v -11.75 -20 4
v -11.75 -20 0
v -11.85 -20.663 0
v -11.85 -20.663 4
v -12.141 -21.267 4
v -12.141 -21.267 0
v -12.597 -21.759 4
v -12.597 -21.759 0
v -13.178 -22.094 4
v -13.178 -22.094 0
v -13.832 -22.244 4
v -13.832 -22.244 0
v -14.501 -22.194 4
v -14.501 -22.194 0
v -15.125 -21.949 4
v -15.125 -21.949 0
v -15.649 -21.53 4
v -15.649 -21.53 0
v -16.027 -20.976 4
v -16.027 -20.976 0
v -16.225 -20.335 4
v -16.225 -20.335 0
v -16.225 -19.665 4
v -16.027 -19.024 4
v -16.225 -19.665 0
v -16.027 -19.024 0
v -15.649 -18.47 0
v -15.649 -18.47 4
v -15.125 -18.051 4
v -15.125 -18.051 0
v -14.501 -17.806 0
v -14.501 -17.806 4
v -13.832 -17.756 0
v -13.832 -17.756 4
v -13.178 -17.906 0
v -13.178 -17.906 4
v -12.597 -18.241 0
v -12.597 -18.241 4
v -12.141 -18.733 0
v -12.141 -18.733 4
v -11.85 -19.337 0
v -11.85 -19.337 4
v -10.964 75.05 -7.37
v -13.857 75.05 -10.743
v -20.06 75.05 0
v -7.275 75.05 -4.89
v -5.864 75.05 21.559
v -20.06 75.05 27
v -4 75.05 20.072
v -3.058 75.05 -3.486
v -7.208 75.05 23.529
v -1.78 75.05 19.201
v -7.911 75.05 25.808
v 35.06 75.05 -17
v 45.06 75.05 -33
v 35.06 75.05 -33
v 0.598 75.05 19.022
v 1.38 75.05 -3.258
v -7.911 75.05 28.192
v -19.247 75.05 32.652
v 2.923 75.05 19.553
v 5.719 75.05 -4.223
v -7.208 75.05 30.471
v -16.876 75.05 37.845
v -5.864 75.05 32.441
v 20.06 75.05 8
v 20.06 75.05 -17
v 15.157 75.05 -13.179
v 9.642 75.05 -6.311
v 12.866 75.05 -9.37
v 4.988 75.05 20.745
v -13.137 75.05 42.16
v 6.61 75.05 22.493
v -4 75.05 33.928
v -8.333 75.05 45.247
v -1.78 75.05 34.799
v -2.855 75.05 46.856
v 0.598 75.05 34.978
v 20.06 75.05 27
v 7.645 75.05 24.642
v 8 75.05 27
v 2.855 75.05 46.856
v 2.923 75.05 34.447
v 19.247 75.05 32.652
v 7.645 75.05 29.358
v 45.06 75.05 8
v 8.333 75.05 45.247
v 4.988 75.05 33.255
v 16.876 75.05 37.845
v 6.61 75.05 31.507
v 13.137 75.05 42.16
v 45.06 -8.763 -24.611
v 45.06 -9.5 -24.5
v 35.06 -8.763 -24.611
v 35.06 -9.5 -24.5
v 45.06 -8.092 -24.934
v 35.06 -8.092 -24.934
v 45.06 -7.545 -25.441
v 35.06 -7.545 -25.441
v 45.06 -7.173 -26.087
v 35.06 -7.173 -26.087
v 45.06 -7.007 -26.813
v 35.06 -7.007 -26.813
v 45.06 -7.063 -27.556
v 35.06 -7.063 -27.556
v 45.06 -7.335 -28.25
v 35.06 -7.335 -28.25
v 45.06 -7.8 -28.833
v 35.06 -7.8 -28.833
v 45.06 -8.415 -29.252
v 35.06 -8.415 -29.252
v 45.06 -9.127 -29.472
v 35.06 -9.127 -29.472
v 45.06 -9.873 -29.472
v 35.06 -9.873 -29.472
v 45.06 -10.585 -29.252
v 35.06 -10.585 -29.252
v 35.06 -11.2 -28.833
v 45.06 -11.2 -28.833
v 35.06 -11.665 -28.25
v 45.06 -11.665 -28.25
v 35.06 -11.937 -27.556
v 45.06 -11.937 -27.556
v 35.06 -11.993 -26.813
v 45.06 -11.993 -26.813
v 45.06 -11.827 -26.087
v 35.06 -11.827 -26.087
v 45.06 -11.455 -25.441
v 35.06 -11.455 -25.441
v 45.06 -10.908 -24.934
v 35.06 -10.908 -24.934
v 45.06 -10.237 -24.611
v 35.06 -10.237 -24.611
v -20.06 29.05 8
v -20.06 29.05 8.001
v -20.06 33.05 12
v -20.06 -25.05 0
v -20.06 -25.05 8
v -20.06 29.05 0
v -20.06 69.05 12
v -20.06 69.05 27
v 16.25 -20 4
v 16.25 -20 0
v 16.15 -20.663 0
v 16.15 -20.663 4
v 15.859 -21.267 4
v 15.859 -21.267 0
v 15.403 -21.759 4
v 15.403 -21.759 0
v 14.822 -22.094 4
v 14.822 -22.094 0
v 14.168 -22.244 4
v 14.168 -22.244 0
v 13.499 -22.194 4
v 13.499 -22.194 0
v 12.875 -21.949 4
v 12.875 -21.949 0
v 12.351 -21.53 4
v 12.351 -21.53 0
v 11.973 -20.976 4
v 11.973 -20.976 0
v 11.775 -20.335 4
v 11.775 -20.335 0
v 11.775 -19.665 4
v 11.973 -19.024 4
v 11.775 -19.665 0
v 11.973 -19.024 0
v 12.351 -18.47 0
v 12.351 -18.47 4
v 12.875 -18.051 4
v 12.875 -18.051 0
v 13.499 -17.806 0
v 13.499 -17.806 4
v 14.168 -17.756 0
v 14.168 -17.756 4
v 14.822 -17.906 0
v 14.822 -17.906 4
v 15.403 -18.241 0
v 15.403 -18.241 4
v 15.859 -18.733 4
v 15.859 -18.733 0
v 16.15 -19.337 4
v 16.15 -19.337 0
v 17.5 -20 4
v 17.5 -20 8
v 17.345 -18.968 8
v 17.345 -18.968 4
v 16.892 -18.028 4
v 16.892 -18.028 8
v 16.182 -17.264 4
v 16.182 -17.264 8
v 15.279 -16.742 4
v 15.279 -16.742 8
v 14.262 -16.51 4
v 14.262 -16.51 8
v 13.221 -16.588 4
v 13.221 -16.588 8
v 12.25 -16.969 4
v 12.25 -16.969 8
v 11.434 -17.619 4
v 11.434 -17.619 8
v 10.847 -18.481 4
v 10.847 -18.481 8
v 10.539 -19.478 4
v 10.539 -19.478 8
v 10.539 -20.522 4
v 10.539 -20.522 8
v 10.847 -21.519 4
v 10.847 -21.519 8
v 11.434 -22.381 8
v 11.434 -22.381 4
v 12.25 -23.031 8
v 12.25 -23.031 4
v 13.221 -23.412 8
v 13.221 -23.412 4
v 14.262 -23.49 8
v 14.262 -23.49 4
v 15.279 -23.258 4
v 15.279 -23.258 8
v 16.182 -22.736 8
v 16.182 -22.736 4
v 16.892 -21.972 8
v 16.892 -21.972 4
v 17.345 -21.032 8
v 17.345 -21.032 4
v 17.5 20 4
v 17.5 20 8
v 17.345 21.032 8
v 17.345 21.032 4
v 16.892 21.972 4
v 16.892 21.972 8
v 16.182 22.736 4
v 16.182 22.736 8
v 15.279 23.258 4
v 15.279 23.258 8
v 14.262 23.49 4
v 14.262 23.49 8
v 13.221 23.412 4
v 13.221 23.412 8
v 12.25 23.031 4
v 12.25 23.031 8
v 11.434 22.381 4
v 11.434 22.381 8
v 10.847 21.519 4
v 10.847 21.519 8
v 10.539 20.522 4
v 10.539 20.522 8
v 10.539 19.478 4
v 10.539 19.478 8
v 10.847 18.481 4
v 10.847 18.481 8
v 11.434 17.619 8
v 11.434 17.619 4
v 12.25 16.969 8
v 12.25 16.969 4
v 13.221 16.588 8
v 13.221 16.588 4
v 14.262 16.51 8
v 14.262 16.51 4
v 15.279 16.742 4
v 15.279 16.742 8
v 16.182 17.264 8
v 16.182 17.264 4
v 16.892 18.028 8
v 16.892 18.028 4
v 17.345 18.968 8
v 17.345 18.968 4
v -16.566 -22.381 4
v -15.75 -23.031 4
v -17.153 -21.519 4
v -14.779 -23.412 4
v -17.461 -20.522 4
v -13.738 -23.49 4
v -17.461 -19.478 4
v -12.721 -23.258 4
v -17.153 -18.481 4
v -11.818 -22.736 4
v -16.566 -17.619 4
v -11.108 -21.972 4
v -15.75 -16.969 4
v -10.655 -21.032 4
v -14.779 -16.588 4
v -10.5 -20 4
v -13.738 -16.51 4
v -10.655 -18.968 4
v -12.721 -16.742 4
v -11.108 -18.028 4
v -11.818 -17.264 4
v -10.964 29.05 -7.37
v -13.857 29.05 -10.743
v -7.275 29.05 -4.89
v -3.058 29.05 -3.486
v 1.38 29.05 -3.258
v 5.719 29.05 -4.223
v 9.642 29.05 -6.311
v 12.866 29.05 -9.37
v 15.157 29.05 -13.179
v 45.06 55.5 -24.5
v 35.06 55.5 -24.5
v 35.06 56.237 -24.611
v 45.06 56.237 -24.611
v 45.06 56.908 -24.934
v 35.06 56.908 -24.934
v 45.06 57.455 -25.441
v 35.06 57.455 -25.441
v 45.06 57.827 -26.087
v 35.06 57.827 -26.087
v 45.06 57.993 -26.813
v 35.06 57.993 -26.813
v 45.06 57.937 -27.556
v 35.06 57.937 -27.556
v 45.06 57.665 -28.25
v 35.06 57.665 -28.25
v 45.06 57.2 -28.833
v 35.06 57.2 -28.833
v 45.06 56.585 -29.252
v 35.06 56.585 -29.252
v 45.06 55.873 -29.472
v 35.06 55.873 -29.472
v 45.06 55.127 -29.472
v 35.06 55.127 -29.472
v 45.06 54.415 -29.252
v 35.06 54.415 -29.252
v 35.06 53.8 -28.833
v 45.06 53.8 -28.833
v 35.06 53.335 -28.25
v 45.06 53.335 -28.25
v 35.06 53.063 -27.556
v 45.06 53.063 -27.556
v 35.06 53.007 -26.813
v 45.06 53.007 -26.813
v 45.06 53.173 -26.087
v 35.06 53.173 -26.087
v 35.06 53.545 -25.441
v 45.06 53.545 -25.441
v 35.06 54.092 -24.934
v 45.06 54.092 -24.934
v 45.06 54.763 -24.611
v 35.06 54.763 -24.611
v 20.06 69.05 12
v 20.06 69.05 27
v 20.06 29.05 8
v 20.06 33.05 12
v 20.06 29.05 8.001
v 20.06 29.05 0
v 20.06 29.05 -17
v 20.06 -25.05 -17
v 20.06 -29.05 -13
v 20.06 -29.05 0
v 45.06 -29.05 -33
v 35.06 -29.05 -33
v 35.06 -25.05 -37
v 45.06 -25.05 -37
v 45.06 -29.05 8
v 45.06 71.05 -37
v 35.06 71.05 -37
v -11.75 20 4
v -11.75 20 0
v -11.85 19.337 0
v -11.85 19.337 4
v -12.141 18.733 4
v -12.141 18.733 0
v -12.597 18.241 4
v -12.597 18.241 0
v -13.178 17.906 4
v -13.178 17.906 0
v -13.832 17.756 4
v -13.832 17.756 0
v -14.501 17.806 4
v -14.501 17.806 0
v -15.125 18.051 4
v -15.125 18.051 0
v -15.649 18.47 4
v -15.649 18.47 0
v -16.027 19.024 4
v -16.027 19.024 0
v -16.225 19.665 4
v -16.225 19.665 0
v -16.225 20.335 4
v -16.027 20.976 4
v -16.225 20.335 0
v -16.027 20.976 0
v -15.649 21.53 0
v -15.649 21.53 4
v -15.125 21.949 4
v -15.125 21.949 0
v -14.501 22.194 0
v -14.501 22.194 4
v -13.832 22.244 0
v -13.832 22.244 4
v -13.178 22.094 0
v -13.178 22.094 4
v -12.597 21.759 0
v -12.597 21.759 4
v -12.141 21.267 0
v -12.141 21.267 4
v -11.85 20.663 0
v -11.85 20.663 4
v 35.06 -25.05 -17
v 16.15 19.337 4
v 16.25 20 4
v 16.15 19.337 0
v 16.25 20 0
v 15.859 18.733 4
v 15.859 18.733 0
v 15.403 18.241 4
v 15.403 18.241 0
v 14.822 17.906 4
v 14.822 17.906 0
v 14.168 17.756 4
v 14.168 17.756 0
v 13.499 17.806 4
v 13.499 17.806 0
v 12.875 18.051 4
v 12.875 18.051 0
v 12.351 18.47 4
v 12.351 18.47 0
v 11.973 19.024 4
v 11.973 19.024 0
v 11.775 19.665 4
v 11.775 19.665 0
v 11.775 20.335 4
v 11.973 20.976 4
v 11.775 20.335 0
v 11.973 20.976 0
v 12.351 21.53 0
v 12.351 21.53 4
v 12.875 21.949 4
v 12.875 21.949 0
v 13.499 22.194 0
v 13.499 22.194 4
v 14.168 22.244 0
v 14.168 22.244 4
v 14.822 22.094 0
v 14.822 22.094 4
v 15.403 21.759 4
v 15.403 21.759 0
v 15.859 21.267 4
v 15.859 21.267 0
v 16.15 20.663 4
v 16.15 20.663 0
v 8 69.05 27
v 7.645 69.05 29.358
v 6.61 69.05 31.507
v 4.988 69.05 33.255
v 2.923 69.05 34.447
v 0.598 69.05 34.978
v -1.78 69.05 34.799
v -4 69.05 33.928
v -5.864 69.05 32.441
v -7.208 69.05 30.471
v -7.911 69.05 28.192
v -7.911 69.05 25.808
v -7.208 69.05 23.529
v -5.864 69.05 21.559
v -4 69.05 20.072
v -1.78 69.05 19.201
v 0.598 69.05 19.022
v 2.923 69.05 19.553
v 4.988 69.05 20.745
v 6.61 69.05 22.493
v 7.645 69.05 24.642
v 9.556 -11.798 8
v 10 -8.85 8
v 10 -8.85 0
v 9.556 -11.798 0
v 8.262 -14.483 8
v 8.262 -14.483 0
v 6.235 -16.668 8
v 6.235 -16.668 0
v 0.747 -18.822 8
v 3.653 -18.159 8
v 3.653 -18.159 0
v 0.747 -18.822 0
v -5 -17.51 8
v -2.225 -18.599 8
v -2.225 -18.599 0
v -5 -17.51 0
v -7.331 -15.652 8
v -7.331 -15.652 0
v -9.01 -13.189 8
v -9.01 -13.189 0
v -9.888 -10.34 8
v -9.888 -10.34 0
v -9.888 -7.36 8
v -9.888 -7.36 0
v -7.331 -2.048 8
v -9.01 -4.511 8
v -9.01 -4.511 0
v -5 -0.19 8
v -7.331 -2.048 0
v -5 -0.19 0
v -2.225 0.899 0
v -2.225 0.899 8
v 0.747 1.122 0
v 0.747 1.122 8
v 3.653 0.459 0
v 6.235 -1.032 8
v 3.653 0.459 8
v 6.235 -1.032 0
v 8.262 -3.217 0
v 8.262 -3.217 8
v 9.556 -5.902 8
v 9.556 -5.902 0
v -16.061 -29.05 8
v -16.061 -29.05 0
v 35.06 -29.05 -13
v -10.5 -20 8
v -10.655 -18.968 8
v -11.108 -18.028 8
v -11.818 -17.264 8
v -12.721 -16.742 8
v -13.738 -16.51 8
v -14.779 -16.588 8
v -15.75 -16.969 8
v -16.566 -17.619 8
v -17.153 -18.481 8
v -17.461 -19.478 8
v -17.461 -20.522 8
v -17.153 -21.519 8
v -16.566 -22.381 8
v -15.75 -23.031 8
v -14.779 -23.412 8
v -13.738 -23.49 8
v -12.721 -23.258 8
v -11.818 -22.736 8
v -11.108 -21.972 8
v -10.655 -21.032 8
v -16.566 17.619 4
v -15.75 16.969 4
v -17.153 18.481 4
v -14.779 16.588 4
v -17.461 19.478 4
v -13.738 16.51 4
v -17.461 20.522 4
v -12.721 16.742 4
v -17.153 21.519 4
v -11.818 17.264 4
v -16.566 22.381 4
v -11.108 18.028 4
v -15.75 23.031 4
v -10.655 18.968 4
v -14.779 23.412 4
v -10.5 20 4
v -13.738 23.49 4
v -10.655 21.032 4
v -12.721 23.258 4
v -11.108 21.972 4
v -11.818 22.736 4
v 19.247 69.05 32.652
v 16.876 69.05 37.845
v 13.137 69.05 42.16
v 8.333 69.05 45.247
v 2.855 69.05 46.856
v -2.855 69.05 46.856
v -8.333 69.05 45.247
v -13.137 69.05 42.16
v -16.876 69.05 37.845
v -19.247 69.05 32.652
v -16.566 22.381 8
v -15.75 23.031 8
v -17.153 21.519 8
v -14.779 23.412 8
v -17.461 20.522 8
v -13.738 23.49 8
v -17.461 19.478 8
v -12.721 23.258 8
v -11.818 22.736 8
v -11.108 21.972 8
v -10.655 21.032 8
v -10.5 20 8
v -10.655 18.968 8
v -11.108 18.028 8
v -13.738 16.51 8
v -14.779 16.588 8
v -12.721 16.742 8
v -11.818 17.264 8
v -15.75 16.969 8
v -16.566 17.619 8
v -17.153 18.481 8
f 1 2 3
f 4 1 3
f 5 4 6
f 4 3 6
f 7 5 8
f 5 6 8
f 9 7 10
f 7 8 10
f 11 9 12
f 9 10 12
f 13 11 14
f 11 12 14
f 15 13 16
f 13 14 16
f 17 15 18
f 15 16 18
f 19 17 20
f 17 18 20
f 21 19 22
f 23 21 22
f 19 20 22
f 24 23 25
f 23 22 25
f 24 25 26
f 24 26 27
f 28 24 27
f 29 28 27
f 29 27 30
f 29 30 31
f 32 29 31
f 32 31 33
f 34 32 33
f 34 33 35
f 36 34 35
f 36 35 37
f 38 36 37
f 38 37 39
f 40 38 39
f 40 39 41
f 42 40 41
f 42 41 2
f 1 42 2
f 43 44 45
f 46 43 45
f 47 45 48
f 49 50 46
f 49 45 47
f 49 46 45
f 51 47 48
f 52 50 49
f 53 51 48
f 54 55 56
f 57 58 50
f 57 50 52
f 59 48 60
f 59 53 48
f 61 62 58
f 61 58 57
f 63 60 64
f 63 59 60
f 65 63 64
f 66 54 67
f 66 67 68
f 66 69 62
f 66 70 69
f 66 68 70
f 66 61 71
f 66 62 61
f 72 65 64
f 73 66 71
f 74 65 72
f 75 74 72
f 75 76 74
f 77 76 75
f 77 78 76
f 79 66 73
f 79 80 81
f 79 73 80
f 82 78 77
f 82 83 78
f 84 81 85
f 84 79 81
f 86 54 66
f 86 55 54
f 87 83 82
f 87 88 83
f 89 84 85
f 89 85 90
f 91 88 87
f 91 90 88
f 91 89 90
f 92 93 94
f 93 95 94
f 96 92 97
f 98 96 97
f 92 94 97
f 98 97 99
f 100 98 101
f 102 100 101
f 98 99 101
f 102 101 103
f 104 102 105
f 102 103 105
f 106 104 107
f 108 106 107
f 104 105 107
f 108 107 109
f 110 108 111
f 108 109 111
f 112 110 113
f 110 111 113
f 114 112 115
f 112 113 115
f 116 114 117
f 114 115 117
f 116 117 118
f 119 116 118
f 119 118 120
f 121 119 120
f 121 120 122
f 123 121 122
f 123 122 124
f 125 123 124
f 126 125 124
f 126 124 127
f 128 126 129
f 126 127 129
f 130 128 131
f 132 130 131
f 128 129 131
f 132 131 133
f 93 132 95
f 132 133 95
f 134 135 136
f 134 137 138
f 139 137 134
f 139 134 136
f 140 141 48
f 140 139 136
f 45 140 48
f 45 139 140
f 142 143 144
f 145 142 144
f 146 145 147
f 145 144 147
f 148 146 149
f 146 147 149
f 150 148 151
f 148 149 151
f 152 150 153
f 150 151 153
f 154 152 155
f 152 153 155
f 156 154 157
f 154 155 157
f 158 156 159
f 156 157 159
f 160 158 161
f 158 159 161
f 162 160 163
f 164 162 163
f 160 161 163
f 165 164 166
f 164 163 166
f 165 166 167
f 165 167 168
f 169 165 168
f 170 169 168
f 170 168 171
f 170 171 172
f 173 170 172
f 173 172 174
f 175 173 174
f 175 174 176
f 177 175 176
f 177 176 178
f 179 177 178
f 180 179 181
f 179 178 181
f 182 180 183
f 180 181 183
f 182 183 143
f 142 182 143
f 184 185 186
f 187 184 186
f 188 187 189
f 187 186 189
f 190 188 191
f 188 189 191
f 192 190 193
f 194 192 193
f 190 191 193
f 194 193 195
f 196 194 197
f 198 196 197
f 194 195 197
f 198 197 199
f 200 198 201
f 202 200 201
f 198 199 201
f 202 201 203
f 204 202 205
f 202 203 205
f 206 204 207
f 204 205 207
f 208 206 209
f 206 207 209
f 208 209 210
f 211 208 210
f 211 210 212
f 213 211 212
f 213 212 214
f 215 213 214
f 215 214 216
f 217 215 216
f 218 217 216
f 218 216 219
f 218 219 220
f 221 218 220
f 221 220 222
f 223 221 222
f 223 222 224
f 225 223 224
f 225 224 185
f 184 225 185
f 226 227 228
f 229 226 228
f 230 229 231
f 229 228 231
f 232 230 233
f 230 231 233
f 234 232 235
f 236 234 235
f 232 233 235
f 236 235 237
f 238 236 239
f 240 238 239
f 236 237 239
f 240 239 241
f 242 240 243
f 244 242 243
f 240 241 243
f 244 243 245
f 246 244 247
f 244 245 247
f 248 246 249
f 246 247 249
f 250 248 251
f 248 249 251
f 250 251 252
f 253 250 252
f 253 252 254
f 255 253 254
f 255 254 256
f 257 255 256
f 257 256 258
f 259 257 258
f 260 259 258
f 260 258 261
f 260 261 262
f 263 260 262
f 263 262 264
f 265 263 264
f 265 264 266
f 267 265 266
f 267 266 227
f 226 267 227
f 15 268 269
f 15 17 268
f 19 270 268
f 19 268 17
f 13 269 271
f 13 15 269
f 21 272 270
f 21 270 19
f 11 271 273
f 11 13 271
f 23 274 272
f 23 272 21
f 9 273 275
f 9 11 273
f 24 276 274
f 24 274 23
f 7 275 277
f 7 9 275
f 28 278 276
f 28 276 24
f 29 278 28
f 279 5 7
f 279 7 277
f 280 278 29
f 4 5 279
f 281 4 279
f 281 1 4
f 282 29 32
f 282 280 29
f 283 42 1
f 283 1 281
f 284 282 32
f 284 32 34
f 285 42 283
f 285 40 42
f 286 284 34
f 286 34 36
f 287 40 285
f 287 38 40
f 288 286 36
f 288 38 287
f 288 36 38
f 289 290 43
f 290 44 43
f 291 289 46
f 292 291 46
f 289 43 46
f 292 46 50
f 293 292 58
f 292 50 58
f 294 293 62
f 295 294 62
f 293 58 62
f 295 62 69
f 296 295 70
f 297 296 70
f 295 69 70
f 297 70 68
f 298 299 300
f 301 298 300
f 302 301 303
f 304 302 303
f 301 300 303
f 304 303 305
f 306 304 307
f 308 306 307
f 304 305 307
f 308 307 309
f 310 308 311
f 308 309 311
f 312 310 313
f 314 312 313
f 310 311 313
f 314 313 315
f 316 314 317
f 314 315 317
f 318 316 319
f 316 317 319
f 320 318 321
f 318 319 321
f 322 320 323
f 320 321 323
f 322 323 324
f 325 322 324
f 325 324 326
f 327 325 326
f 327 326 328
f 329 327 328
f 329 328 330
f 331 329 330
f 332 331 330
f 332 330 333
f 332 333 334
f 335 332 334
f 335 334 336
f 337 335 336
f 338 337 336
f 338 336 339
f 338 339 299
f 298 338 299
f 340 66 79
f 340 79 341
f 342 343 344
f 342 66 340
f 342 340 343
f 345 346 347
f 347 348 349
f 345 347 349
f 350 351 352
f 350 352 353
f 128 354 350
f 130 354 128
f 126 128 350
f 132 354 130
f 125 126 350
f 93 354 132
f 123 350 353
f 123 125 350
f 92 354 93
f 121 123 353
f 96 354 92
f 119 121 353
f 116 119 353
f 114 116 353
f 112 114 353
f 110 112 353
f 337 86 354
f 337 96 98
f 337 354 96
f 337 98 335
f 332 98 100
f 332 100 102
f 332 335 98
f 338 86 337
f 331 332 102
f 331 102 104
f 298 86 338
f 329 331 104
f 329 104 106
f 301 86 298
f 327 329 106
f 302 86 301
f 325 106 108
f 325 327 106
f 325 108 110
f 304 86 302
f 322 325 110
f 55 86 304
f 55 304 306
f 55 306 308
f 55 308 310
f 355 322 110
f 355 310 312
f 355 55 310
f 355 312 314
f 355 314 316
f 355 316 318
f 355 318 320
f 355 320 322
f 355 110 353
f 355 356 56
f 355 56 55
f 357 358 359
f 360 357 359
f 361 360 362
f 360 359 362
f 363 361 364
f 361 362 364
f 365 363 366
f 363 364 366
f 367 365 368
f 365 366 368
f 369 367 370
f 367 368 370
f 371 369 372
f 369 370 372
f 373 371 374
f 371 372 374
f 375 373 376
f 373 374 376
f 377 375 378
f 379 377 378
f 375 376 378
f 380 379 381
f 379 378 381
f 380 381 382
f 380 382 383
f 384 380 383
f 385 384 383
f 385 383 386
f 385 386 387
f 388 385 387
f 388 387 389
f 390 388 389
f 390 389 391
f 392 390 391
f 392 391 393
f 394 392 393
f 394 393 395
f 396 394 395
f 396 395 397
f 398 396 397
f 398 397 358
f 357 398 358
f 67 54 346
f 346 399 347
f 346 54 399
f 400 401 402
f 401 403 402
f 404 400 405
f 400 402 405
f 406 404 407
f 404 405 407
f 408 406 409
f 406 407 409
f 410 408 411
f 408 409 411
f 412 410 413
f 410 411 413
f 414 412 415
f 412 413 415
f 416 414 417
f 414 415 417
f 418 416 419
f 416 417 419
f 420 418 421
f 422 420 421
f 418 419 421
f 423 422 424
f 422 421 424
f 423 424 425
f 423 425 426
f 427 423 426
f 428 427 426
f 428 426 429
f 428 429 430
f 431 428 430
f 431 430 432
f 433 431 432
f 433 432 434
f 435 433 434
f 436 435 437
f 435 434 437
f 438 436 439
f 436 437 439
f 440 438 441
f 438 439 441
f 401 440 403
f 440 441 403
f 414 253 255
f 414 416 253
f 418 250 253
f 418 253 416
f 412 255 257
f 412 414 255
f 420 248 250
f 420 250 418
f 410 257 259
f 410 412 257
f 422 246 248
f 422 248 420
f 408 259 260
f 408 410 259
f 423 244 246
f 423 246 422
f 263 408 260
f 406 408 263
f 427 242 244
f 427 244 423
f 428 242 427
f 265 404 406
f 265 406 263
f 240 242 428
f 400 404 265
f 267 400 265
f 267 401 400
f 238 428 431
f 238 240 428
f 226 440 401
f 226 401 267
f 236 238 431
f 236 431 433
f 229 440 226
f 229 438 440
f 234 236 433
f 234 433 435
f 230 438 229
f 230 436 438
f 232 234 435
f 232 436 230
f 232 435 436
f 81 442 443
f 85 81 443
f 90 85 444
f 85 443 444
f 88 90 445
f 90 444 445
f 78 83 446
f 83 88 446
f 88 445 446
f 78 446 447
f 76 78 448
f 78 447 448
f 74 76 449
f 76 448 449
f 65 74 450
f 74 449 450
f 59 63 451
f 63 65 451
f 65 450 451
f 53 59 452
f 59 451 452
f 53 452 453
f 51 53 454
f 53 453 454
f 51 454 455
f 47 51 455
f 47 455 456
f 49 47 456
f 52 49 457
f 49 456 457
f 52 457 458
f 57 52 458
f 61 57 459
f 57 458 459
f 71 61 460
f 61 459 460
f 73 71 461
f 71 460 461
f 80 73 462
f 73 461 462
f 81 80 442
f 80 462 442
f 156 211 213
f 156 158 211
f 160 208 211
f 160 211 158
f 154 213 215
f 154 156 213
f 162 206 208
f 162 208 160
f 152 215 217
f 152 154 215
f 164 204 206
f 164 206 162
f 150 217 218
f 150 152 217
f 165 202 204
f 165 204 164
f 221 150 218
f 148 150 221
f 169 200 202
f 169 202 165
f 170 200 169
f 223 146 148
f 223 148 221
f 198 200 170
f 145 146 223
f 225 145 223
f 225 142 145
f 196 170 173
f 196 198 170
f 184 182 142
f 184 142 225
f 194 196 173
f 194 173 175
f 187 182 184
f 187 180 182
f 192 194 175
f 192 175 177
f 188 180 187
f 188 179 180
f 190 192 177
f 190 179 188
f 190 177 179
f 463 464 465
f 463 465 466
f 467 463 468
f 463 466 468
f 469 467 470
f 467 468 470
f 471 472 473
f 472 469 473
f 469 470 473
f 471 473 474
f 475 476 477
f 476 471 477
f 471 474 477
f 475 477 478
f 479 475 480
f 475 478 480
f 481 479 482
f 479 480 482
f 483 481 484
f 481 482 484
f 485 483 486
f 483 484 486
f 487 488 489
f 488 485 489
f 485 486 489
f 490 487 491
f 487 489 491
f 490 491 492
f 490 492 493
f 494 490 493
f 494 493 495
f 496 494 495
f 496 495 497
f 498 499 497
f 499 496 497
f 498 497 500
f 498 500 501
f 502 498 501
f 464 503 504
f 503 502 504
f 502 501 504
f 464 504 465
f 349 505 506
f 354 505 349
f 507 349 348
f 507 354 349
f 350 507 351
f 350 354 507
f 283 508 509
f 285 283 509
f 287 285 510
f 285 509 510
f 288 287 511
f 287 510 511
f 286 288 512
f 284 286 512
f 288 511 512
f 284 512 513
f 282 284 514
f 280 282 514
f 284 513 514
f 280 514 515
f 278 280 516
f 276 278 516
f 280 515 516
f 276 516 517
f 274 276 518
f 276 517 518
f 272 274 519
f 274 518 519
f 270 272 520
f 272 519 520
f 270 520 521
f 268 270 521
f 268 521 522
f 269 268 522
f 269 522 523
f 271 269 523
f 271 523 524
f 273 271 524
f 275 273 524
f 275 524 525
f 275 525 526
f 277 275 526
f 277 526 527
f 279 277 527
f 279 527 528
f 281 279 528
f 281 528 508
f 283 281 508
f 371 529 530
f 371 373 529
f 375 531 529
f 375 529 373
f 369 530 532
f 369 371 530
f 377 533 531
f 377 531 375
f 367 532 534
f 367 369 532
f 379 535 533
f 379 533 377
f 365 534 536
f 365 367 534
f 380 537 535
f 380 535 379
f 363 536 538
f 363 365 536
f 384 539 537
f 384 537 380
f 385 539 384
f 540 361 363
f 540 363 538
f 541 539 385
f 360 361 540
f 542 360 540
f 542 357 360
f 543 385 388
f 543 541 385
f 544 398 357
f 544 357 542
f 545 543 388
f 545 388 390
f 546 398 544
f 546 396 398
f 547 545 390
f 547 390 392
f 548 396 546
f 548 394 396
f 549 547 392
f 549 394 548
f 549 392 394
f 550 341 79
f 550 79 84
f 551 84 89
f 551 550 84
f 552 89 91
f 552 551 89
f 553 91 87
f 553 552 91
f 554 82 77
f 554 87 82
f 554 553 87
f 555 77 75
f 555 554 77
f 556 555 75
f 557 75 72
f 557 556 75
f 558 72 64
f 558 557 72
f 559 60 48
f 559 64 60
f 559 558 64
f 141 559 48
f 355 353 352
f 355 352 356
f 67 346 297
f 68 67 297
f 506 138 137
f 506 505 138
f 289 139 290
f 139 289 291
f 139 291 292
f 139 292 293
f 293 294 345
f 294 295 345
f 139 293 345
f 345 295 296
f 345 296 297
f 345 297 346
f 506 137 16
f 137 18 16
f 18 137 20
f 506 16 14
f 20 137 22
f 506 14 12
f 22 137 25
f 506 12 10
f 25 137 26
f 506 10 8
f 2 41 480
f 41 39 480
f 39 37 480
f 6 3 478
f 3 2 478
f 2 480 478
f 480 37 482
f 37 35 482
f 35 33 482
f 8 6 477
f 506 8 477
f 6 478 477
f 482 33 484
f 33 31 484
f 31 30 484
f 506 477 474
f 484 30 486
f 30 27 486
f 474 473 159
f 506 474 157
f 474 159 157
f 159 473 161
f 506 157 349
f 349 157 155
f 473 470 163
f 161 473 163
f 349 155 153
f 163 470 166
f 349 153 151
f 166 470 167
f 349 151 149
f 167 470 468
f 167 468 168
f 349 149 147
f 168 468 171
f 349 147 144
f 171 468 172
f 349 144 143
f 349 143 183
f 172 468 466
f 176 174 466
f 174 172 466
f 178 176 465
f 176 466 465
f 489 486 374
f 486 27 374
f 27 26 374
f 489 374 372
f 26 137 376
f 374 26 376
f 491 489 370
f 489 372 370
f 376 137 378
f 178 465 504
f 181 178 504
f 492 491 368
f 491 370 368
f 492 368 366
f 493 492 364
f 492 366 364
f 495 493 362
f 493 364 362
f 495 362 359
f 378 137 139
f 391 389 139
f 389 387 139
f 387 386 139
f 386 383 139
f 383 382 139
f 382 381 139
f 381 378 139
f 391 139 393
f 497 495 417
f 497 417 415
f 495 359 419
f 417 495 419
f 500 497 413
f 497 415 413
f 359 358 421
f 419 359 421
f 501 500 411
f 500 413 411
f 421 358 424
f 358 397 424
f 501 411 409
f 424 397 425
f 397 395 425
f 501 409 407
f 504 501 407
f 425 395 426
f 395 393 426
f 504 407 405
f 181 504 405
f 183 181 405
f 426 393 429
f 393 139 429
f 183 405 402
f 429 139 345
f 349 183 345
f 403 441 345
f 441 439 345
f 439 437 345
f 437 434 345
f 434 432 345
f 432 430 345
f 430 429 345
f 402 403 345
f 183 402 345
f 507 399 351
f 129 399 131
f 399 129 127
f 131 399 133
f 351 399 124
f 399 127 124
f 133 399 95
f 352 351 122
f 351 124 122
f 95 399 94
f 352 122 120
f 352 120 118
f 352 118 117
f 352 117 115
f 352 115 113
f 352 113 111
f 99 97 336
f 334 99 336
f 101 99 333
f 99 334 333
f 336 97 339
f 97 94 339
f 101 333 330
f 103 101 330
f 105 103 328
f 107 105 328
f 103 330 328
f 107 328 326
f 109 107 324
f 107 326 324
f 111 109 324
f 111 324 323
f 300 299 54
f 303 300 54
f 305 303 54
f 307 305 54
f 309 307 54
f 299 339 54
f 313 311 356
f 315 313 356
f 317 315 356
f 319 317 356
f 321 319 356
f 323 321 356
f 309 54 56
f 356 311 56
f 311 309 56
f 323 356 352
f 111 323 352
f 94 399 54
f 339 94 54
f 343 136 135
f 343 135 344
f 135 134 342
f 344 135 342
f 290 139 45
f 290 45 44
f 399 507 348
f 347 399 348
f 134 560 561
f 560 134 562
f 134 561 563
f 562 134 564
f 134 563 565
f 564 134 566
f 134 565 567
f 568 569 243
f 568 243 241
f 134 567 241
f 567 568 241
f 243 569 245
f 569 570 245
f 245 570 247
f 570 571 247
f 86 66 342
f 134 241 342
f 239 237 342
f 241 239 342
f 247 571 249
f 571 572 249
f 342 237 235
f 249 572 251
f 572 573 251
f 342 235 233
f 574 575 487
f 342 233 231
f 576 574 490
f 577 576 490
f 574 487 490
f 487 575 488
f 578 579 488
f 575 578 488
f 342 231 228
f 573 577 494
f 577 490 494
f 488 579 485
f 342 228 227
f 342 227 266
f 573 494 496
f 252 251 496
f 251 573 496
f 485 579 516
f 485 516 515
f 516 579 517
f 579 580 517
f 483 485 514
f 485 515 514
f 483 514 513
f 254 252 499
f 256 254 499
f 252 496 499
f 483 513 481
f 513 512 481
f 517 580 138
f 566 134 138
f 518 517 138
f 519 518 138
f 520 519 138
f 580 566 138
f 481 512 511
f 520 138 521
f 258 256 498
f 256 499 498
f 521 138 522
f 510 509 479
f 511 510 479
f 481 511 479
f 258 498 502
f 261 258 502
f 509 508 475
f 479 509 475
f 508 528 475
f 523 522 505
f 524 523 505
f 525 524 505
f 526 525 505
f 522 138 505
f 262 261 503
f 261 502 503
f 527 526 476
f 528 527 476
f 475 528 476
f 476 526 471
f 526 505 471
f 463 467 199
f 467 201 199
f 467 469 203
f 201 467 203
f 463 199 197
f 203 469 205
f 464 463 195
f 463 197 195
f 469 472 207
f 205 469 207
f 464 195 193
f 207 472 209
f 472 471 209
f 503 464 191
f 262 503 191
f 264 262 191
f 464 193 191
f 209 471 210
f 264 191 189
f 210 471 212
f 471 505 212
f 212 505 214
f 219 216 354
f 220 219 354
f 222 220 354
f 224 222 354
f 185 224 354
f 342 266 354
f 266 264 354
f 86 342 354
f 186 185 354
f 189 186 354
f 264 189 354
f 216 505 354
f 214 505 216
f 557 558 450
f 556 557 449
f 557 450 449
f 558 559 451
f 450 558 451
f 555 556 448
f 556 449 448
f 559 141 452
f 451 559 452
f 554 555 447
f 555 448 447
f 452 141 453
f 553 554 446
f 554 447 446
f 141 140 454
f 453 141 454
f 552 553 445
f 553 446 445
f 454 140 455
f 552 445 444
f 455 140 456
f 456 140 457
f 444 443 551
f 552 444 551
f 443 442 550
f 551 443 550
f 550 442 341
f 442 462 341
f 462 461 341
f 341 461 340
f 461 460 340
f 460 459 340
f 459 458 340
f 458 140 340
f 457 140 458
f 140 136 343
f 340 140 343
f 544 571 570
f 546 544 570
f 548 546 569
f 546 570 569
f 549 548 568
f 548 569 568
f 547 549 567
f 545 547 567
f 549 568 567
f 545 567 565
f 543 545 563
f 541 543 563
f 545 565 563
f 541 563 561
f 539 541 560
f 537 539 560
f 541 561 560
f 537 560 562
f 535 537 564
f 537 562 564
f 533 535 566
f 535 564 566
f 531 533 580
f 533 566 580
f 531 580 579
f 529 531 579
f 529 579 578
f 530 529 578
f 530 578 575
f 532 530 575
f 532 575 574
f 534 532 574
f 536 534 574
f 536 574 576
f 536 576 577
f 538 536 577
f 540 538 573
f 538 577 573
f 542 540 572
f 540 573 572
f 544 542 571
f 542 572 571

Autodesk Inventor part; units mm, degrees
ref_plane "YZ Plane" through (0, 0, 0) normal (1, 0, 0) x (0, 1, 0)
ref_plane "XZ Plane" through (0, 0, 0) normal (0, 1, 0) x (-1, 0, 0)
ref_plane "XY Plane" through (0, 0, 0) normal (0, 0, 1) x (1, 0, 0)
sketch "Sketch1" plane through (0, 0, 0) normal (0, 0, 1) x (1, 0, 0)
  line L0 (14, -20) -> (-14, -20) construction
  line L1 (-14, -20) -> (-14, 20) construction
  line L2 (-14, 20) -> (14, 20) construction
  line L3 (14, 20) -> (14, -20) construction
  line L4 (14, -20) -> (-14, 20) construction
  line L5 (-14, -20) -> (14, 20) construction
  circle A0 centre (-14, 20) radius 2.25
  circle A1 centre (14, 20) radius 2.25
  circle A2 centre (14, -20) radius 2.25
  circle A3 centre (-14, -20) radius 2.25
  line L6 (0, 0) -> (0, -8.85) construction
  circle A4 centre (0, -8.85) radius 10
  line L7 (20.06, -29.05) -> (-20.06, -29.05)
  line L8 (-20.06, -29.05) -> (-20.06, 29.05)
  line L9 (-20.06, 29.05) -> (20.06, 29.05)
  line L10 (20.06, 29.05) -> (20.06, -29.05)
  line L11 (20.06, -29.05) -> (-20.06, 29.05) construction
  line L12 (-20.06, -29.05) -> (20.06, 29.05) construction
  dimension "d0" = 28
  dimension "d1" = 40
  dimension "d2" = 20
  dimension "d3" = 4.5
  dimension "d4" = 58.1
  dimension "d5" = 40.12
  dimension "d6" = 37.9
extrude "Extrusion1" add sketch "Sketch1" along normal blind 8
sketch "Sketch2" plane through (0, 0, 8) normal (0, 0, 1) x (1, 0, 0)
  circle A0 centre (0, -8.85) radius 10 construction
  circle A1 centre (-14, -20) radius 2.25 construction
  circle A2 centre (14, -20) radius 2.25 construction
  circle A3 centre (14, 20) radius 2.25 construction
  circle A4 centre (-14, 20) radius 2.25 construction
  line L0 (-20.06, -29.05) -> (20.06, -29.05) construction
  line L1 (20.06, -29.05) -> (20.06, 29.05) construction
  line L2 (20.06, 29.05) -> (-20.06, 29.05) construction
  line L3 (-20.06, 29.05) -> (-20.06, -29.05) construction
  circle A5 centre (14, -20) radius 3.5
  circle A6 centre (-14, -20) radius 3.5
  circle A7 centre (14, 20) radius 3.5
  circle A8 centre (-14, 20) radius 3.5
  point P0 (0, 0)
  dimension "d9" = 7
extrude "Extrusion2" cut sketch "Sketch2" against normal blind 4
sketch "Sketch3" plane through (-20.06, 29.05, 0) normal (0, 1, 0) x (1, 0, 0)
  line L0 (40.12, 0) -> (0, 0)
  line L1 (0, 0) -> (0, -12)
  line L2 (0, -12) -> (40.12, -12)
  line L3 (40.12, -12) -> (40.12, 0)
  circle A0 centre (20.06, 19.7) radius 15.5 construction
  line L4 (40.12, 0) -> (33.3508, 11.7247)
  line L5 (0, 0) -> (6.7692, 11.7247)
  arc A1 (6.7692, 11.7247) -> (33.3508, 11.7247) centre (20.06, 19.7) ccw
  line L6 (40.12, 0) -> (0, 0) projected
  line L7 (40.12, 0) -> (0, 0)
  point P0 (20.06, 0)
  dimension "d12" = 12
  dimension "d19" = 60
extrude "Extrusion3" add sketch "Sketch3" along normal blind 40
sketch "Sketch4" plane through (-20.06, 69.05, 0) normal (0, 1, 0) x (1, 0, 0)
  line L0 (20.06, 0) -> (20.06, -27) construction
  circle A0 centre (20.06, -27) radius 8
  line L1 (20.06, -27) -> (20.06, 0) construction
  line L2 (40.12, 0) -> (0, 0) projected
  line L3 (40.12, -27) -> (40.12, 0)
  line L4 (0, 0) -> (0, -27)
  arc A1 (0, -27) -> (40.12, -27) centre (20.06, -27) ccw
  arc A2 (40.12, 0) -> (0, 0) centre (20.06, 0) ccw construction
  line L5 (40.12, 0) -> (40.12, -8) projected
  line L6 (40.12, 0) -> (0, 0)
  line L7 (0, 0) -> (40.12, 0)
  line L8 (40.12, 0) -> (33.3508, 11.7247) projected
  arc A3 (6.7692, 11.7247) -> (33.3508, 11.7247) centre (20.06, 19.7) ccw projected
  line L9 (6.7692, 11.7247) -> (0, 0) projected
  line L10 (0, 0) -> (0, -12) projected
  line L11 (0, -12) -> (40.12, -12) projected
  line L12 (40.12, -12) -> (40.12, 0) projected
  point P0 (20.06, -13.5)
  dimension "d15" = 27
  dimension "d16" = 16
extrude "Extrusion4" add sketch "Sketch4" along normal blind 6
sketch "Sketch5" plane through (-20.06, -29.05, 0) normal (0, -1, 0) x (1, 0, 0)
  line L0 (40.12, 0) -> (40.12, 8) projected
  line L1 (40.12, 8) -> (65.12, 8)
  line L2 (65.12, 8) -> (65.12, -17)
  line L3 (65.12, -17) -> (40.12, -17)
  line L4 (40.12, -17) -> (40.12, 8)
  line L5 (40.12, 0) -> (33.3508, -11.7247) projected
  line L6 (33.3508, -11.7247) -> (40.12, -17)
  line L7 (40.12, 27) -> (40.12, 0) projected
  line L8 (40.12, -17) -> (40.12, 0)
  point P0 (20.06, 0)
  dimension "d20" = 25
  dimension "d21" = 25
extrude "Extrusion5" add sketch "Sketch5" against normal up to surface (58.1 mm away) contours L0 L1 L2 L3 L4
sketch "Sketch6" plane through (20.06, 29.05, -17) normal (0, 1, 0) x (1, 0, 0)
  line L0 (25, 0) -> (0, 0) projected
  line L1 (0, 0) -> (0, -17) projected
  line L2 (0, -25) -> (0, -17) projected
  line L3 (0, -25) -> (25, -25) projected
  line L4 (25, -25) -> (25, 0) projected
  line L5 (0, -17) -> (-6.7692, -5.2753) projected
  line L6 (25, 0) -> (0, 0) projected
  line L7 (0, 0) -> (-6.7692, -5.2753)
  line L8 (0, 0) -> (0, -17) projected
  line L9 (0, -17) -> (0, 0)
  point P0 (-20.06, -17)
extrude "Extrusion6" add sketch "Sketch6" along normal up to surface (46 mm away)
sketch "Sketch7" plane through (45.06, -29.05, 8) normal (1, 0, 0) x (0, 0, -1)
  line L0 (25, 104.1) -> (0, 104.1) projected
  line L1 (25, 0) -> (25, 104.1) projected
  line L2 (25, 104.1) -> (25, 0)
  line L3 (25, 0) -> (45, 0)
  line L4 (45, 0) -> (45, 104.1)
  line L5 (45, 104.1) -> (25, 104.1)
  point P0 (8, 29.05)
  dimension "d26" = 20
extrude "Extrusion7" add sketch "Sketch7" against normal blind 10
sketch "Sketch8" plane through (35.06, -29.05, 8) normal (-1, 0, 0) x (0, 0, 1)
  line L0 (-25, 104.1) -> (-25, 0) projected
  line L1 (-25, 104.1) -> (-45, 104.1) projected
  line L2 (-45, 104.1) -> (-45, 0) projected
  line L3 (-45, 0) -> (-25, 0) projected
  line L4 (-45, 104.1) -> (-45, 0) projected
  line L5 (-45, 52.05) -> (-25, 52.05) construction
  line L6 (-35, 84.55) -> (-35, 19.55) construction
  circle A0 centre (-35, 84.55) radius 2.5
  circle A1 centre (-35, 19.55) radius 2.5
  point P0 (-8, 29.05)
  point P1 (-35, 52.05)
  dimension "d29" = 65
  dimension "d30" = 5
extrude "Extrusion8" cut sketch "Sketch8" against normal through all contours A0 | A1
chamfer "Chamfer1" distance 4 angle 45 5 edges at (40.06, 75.05, -37) (40.06, -29.05, -37) (27.56, -29.05, -17) (-20.06, -29.05, 4) (0, 29.05, 12)
sketch "Sketch9" plane through (-20.06, 75.05, 0) normal (0, 1, 0) x (1, 0, 0)
  circle A0 centre (20.06, 19.7) radius 15.5 construction
  circle A1 centre (20.06, 19.7) radius 16.5
  point P0 (20.06, 0)
  dimension "d36" = 1
extrude "Extrusion9" cut sketch "Sketch9" against normal up to surface (46 mm away)
properties part number "frame"
